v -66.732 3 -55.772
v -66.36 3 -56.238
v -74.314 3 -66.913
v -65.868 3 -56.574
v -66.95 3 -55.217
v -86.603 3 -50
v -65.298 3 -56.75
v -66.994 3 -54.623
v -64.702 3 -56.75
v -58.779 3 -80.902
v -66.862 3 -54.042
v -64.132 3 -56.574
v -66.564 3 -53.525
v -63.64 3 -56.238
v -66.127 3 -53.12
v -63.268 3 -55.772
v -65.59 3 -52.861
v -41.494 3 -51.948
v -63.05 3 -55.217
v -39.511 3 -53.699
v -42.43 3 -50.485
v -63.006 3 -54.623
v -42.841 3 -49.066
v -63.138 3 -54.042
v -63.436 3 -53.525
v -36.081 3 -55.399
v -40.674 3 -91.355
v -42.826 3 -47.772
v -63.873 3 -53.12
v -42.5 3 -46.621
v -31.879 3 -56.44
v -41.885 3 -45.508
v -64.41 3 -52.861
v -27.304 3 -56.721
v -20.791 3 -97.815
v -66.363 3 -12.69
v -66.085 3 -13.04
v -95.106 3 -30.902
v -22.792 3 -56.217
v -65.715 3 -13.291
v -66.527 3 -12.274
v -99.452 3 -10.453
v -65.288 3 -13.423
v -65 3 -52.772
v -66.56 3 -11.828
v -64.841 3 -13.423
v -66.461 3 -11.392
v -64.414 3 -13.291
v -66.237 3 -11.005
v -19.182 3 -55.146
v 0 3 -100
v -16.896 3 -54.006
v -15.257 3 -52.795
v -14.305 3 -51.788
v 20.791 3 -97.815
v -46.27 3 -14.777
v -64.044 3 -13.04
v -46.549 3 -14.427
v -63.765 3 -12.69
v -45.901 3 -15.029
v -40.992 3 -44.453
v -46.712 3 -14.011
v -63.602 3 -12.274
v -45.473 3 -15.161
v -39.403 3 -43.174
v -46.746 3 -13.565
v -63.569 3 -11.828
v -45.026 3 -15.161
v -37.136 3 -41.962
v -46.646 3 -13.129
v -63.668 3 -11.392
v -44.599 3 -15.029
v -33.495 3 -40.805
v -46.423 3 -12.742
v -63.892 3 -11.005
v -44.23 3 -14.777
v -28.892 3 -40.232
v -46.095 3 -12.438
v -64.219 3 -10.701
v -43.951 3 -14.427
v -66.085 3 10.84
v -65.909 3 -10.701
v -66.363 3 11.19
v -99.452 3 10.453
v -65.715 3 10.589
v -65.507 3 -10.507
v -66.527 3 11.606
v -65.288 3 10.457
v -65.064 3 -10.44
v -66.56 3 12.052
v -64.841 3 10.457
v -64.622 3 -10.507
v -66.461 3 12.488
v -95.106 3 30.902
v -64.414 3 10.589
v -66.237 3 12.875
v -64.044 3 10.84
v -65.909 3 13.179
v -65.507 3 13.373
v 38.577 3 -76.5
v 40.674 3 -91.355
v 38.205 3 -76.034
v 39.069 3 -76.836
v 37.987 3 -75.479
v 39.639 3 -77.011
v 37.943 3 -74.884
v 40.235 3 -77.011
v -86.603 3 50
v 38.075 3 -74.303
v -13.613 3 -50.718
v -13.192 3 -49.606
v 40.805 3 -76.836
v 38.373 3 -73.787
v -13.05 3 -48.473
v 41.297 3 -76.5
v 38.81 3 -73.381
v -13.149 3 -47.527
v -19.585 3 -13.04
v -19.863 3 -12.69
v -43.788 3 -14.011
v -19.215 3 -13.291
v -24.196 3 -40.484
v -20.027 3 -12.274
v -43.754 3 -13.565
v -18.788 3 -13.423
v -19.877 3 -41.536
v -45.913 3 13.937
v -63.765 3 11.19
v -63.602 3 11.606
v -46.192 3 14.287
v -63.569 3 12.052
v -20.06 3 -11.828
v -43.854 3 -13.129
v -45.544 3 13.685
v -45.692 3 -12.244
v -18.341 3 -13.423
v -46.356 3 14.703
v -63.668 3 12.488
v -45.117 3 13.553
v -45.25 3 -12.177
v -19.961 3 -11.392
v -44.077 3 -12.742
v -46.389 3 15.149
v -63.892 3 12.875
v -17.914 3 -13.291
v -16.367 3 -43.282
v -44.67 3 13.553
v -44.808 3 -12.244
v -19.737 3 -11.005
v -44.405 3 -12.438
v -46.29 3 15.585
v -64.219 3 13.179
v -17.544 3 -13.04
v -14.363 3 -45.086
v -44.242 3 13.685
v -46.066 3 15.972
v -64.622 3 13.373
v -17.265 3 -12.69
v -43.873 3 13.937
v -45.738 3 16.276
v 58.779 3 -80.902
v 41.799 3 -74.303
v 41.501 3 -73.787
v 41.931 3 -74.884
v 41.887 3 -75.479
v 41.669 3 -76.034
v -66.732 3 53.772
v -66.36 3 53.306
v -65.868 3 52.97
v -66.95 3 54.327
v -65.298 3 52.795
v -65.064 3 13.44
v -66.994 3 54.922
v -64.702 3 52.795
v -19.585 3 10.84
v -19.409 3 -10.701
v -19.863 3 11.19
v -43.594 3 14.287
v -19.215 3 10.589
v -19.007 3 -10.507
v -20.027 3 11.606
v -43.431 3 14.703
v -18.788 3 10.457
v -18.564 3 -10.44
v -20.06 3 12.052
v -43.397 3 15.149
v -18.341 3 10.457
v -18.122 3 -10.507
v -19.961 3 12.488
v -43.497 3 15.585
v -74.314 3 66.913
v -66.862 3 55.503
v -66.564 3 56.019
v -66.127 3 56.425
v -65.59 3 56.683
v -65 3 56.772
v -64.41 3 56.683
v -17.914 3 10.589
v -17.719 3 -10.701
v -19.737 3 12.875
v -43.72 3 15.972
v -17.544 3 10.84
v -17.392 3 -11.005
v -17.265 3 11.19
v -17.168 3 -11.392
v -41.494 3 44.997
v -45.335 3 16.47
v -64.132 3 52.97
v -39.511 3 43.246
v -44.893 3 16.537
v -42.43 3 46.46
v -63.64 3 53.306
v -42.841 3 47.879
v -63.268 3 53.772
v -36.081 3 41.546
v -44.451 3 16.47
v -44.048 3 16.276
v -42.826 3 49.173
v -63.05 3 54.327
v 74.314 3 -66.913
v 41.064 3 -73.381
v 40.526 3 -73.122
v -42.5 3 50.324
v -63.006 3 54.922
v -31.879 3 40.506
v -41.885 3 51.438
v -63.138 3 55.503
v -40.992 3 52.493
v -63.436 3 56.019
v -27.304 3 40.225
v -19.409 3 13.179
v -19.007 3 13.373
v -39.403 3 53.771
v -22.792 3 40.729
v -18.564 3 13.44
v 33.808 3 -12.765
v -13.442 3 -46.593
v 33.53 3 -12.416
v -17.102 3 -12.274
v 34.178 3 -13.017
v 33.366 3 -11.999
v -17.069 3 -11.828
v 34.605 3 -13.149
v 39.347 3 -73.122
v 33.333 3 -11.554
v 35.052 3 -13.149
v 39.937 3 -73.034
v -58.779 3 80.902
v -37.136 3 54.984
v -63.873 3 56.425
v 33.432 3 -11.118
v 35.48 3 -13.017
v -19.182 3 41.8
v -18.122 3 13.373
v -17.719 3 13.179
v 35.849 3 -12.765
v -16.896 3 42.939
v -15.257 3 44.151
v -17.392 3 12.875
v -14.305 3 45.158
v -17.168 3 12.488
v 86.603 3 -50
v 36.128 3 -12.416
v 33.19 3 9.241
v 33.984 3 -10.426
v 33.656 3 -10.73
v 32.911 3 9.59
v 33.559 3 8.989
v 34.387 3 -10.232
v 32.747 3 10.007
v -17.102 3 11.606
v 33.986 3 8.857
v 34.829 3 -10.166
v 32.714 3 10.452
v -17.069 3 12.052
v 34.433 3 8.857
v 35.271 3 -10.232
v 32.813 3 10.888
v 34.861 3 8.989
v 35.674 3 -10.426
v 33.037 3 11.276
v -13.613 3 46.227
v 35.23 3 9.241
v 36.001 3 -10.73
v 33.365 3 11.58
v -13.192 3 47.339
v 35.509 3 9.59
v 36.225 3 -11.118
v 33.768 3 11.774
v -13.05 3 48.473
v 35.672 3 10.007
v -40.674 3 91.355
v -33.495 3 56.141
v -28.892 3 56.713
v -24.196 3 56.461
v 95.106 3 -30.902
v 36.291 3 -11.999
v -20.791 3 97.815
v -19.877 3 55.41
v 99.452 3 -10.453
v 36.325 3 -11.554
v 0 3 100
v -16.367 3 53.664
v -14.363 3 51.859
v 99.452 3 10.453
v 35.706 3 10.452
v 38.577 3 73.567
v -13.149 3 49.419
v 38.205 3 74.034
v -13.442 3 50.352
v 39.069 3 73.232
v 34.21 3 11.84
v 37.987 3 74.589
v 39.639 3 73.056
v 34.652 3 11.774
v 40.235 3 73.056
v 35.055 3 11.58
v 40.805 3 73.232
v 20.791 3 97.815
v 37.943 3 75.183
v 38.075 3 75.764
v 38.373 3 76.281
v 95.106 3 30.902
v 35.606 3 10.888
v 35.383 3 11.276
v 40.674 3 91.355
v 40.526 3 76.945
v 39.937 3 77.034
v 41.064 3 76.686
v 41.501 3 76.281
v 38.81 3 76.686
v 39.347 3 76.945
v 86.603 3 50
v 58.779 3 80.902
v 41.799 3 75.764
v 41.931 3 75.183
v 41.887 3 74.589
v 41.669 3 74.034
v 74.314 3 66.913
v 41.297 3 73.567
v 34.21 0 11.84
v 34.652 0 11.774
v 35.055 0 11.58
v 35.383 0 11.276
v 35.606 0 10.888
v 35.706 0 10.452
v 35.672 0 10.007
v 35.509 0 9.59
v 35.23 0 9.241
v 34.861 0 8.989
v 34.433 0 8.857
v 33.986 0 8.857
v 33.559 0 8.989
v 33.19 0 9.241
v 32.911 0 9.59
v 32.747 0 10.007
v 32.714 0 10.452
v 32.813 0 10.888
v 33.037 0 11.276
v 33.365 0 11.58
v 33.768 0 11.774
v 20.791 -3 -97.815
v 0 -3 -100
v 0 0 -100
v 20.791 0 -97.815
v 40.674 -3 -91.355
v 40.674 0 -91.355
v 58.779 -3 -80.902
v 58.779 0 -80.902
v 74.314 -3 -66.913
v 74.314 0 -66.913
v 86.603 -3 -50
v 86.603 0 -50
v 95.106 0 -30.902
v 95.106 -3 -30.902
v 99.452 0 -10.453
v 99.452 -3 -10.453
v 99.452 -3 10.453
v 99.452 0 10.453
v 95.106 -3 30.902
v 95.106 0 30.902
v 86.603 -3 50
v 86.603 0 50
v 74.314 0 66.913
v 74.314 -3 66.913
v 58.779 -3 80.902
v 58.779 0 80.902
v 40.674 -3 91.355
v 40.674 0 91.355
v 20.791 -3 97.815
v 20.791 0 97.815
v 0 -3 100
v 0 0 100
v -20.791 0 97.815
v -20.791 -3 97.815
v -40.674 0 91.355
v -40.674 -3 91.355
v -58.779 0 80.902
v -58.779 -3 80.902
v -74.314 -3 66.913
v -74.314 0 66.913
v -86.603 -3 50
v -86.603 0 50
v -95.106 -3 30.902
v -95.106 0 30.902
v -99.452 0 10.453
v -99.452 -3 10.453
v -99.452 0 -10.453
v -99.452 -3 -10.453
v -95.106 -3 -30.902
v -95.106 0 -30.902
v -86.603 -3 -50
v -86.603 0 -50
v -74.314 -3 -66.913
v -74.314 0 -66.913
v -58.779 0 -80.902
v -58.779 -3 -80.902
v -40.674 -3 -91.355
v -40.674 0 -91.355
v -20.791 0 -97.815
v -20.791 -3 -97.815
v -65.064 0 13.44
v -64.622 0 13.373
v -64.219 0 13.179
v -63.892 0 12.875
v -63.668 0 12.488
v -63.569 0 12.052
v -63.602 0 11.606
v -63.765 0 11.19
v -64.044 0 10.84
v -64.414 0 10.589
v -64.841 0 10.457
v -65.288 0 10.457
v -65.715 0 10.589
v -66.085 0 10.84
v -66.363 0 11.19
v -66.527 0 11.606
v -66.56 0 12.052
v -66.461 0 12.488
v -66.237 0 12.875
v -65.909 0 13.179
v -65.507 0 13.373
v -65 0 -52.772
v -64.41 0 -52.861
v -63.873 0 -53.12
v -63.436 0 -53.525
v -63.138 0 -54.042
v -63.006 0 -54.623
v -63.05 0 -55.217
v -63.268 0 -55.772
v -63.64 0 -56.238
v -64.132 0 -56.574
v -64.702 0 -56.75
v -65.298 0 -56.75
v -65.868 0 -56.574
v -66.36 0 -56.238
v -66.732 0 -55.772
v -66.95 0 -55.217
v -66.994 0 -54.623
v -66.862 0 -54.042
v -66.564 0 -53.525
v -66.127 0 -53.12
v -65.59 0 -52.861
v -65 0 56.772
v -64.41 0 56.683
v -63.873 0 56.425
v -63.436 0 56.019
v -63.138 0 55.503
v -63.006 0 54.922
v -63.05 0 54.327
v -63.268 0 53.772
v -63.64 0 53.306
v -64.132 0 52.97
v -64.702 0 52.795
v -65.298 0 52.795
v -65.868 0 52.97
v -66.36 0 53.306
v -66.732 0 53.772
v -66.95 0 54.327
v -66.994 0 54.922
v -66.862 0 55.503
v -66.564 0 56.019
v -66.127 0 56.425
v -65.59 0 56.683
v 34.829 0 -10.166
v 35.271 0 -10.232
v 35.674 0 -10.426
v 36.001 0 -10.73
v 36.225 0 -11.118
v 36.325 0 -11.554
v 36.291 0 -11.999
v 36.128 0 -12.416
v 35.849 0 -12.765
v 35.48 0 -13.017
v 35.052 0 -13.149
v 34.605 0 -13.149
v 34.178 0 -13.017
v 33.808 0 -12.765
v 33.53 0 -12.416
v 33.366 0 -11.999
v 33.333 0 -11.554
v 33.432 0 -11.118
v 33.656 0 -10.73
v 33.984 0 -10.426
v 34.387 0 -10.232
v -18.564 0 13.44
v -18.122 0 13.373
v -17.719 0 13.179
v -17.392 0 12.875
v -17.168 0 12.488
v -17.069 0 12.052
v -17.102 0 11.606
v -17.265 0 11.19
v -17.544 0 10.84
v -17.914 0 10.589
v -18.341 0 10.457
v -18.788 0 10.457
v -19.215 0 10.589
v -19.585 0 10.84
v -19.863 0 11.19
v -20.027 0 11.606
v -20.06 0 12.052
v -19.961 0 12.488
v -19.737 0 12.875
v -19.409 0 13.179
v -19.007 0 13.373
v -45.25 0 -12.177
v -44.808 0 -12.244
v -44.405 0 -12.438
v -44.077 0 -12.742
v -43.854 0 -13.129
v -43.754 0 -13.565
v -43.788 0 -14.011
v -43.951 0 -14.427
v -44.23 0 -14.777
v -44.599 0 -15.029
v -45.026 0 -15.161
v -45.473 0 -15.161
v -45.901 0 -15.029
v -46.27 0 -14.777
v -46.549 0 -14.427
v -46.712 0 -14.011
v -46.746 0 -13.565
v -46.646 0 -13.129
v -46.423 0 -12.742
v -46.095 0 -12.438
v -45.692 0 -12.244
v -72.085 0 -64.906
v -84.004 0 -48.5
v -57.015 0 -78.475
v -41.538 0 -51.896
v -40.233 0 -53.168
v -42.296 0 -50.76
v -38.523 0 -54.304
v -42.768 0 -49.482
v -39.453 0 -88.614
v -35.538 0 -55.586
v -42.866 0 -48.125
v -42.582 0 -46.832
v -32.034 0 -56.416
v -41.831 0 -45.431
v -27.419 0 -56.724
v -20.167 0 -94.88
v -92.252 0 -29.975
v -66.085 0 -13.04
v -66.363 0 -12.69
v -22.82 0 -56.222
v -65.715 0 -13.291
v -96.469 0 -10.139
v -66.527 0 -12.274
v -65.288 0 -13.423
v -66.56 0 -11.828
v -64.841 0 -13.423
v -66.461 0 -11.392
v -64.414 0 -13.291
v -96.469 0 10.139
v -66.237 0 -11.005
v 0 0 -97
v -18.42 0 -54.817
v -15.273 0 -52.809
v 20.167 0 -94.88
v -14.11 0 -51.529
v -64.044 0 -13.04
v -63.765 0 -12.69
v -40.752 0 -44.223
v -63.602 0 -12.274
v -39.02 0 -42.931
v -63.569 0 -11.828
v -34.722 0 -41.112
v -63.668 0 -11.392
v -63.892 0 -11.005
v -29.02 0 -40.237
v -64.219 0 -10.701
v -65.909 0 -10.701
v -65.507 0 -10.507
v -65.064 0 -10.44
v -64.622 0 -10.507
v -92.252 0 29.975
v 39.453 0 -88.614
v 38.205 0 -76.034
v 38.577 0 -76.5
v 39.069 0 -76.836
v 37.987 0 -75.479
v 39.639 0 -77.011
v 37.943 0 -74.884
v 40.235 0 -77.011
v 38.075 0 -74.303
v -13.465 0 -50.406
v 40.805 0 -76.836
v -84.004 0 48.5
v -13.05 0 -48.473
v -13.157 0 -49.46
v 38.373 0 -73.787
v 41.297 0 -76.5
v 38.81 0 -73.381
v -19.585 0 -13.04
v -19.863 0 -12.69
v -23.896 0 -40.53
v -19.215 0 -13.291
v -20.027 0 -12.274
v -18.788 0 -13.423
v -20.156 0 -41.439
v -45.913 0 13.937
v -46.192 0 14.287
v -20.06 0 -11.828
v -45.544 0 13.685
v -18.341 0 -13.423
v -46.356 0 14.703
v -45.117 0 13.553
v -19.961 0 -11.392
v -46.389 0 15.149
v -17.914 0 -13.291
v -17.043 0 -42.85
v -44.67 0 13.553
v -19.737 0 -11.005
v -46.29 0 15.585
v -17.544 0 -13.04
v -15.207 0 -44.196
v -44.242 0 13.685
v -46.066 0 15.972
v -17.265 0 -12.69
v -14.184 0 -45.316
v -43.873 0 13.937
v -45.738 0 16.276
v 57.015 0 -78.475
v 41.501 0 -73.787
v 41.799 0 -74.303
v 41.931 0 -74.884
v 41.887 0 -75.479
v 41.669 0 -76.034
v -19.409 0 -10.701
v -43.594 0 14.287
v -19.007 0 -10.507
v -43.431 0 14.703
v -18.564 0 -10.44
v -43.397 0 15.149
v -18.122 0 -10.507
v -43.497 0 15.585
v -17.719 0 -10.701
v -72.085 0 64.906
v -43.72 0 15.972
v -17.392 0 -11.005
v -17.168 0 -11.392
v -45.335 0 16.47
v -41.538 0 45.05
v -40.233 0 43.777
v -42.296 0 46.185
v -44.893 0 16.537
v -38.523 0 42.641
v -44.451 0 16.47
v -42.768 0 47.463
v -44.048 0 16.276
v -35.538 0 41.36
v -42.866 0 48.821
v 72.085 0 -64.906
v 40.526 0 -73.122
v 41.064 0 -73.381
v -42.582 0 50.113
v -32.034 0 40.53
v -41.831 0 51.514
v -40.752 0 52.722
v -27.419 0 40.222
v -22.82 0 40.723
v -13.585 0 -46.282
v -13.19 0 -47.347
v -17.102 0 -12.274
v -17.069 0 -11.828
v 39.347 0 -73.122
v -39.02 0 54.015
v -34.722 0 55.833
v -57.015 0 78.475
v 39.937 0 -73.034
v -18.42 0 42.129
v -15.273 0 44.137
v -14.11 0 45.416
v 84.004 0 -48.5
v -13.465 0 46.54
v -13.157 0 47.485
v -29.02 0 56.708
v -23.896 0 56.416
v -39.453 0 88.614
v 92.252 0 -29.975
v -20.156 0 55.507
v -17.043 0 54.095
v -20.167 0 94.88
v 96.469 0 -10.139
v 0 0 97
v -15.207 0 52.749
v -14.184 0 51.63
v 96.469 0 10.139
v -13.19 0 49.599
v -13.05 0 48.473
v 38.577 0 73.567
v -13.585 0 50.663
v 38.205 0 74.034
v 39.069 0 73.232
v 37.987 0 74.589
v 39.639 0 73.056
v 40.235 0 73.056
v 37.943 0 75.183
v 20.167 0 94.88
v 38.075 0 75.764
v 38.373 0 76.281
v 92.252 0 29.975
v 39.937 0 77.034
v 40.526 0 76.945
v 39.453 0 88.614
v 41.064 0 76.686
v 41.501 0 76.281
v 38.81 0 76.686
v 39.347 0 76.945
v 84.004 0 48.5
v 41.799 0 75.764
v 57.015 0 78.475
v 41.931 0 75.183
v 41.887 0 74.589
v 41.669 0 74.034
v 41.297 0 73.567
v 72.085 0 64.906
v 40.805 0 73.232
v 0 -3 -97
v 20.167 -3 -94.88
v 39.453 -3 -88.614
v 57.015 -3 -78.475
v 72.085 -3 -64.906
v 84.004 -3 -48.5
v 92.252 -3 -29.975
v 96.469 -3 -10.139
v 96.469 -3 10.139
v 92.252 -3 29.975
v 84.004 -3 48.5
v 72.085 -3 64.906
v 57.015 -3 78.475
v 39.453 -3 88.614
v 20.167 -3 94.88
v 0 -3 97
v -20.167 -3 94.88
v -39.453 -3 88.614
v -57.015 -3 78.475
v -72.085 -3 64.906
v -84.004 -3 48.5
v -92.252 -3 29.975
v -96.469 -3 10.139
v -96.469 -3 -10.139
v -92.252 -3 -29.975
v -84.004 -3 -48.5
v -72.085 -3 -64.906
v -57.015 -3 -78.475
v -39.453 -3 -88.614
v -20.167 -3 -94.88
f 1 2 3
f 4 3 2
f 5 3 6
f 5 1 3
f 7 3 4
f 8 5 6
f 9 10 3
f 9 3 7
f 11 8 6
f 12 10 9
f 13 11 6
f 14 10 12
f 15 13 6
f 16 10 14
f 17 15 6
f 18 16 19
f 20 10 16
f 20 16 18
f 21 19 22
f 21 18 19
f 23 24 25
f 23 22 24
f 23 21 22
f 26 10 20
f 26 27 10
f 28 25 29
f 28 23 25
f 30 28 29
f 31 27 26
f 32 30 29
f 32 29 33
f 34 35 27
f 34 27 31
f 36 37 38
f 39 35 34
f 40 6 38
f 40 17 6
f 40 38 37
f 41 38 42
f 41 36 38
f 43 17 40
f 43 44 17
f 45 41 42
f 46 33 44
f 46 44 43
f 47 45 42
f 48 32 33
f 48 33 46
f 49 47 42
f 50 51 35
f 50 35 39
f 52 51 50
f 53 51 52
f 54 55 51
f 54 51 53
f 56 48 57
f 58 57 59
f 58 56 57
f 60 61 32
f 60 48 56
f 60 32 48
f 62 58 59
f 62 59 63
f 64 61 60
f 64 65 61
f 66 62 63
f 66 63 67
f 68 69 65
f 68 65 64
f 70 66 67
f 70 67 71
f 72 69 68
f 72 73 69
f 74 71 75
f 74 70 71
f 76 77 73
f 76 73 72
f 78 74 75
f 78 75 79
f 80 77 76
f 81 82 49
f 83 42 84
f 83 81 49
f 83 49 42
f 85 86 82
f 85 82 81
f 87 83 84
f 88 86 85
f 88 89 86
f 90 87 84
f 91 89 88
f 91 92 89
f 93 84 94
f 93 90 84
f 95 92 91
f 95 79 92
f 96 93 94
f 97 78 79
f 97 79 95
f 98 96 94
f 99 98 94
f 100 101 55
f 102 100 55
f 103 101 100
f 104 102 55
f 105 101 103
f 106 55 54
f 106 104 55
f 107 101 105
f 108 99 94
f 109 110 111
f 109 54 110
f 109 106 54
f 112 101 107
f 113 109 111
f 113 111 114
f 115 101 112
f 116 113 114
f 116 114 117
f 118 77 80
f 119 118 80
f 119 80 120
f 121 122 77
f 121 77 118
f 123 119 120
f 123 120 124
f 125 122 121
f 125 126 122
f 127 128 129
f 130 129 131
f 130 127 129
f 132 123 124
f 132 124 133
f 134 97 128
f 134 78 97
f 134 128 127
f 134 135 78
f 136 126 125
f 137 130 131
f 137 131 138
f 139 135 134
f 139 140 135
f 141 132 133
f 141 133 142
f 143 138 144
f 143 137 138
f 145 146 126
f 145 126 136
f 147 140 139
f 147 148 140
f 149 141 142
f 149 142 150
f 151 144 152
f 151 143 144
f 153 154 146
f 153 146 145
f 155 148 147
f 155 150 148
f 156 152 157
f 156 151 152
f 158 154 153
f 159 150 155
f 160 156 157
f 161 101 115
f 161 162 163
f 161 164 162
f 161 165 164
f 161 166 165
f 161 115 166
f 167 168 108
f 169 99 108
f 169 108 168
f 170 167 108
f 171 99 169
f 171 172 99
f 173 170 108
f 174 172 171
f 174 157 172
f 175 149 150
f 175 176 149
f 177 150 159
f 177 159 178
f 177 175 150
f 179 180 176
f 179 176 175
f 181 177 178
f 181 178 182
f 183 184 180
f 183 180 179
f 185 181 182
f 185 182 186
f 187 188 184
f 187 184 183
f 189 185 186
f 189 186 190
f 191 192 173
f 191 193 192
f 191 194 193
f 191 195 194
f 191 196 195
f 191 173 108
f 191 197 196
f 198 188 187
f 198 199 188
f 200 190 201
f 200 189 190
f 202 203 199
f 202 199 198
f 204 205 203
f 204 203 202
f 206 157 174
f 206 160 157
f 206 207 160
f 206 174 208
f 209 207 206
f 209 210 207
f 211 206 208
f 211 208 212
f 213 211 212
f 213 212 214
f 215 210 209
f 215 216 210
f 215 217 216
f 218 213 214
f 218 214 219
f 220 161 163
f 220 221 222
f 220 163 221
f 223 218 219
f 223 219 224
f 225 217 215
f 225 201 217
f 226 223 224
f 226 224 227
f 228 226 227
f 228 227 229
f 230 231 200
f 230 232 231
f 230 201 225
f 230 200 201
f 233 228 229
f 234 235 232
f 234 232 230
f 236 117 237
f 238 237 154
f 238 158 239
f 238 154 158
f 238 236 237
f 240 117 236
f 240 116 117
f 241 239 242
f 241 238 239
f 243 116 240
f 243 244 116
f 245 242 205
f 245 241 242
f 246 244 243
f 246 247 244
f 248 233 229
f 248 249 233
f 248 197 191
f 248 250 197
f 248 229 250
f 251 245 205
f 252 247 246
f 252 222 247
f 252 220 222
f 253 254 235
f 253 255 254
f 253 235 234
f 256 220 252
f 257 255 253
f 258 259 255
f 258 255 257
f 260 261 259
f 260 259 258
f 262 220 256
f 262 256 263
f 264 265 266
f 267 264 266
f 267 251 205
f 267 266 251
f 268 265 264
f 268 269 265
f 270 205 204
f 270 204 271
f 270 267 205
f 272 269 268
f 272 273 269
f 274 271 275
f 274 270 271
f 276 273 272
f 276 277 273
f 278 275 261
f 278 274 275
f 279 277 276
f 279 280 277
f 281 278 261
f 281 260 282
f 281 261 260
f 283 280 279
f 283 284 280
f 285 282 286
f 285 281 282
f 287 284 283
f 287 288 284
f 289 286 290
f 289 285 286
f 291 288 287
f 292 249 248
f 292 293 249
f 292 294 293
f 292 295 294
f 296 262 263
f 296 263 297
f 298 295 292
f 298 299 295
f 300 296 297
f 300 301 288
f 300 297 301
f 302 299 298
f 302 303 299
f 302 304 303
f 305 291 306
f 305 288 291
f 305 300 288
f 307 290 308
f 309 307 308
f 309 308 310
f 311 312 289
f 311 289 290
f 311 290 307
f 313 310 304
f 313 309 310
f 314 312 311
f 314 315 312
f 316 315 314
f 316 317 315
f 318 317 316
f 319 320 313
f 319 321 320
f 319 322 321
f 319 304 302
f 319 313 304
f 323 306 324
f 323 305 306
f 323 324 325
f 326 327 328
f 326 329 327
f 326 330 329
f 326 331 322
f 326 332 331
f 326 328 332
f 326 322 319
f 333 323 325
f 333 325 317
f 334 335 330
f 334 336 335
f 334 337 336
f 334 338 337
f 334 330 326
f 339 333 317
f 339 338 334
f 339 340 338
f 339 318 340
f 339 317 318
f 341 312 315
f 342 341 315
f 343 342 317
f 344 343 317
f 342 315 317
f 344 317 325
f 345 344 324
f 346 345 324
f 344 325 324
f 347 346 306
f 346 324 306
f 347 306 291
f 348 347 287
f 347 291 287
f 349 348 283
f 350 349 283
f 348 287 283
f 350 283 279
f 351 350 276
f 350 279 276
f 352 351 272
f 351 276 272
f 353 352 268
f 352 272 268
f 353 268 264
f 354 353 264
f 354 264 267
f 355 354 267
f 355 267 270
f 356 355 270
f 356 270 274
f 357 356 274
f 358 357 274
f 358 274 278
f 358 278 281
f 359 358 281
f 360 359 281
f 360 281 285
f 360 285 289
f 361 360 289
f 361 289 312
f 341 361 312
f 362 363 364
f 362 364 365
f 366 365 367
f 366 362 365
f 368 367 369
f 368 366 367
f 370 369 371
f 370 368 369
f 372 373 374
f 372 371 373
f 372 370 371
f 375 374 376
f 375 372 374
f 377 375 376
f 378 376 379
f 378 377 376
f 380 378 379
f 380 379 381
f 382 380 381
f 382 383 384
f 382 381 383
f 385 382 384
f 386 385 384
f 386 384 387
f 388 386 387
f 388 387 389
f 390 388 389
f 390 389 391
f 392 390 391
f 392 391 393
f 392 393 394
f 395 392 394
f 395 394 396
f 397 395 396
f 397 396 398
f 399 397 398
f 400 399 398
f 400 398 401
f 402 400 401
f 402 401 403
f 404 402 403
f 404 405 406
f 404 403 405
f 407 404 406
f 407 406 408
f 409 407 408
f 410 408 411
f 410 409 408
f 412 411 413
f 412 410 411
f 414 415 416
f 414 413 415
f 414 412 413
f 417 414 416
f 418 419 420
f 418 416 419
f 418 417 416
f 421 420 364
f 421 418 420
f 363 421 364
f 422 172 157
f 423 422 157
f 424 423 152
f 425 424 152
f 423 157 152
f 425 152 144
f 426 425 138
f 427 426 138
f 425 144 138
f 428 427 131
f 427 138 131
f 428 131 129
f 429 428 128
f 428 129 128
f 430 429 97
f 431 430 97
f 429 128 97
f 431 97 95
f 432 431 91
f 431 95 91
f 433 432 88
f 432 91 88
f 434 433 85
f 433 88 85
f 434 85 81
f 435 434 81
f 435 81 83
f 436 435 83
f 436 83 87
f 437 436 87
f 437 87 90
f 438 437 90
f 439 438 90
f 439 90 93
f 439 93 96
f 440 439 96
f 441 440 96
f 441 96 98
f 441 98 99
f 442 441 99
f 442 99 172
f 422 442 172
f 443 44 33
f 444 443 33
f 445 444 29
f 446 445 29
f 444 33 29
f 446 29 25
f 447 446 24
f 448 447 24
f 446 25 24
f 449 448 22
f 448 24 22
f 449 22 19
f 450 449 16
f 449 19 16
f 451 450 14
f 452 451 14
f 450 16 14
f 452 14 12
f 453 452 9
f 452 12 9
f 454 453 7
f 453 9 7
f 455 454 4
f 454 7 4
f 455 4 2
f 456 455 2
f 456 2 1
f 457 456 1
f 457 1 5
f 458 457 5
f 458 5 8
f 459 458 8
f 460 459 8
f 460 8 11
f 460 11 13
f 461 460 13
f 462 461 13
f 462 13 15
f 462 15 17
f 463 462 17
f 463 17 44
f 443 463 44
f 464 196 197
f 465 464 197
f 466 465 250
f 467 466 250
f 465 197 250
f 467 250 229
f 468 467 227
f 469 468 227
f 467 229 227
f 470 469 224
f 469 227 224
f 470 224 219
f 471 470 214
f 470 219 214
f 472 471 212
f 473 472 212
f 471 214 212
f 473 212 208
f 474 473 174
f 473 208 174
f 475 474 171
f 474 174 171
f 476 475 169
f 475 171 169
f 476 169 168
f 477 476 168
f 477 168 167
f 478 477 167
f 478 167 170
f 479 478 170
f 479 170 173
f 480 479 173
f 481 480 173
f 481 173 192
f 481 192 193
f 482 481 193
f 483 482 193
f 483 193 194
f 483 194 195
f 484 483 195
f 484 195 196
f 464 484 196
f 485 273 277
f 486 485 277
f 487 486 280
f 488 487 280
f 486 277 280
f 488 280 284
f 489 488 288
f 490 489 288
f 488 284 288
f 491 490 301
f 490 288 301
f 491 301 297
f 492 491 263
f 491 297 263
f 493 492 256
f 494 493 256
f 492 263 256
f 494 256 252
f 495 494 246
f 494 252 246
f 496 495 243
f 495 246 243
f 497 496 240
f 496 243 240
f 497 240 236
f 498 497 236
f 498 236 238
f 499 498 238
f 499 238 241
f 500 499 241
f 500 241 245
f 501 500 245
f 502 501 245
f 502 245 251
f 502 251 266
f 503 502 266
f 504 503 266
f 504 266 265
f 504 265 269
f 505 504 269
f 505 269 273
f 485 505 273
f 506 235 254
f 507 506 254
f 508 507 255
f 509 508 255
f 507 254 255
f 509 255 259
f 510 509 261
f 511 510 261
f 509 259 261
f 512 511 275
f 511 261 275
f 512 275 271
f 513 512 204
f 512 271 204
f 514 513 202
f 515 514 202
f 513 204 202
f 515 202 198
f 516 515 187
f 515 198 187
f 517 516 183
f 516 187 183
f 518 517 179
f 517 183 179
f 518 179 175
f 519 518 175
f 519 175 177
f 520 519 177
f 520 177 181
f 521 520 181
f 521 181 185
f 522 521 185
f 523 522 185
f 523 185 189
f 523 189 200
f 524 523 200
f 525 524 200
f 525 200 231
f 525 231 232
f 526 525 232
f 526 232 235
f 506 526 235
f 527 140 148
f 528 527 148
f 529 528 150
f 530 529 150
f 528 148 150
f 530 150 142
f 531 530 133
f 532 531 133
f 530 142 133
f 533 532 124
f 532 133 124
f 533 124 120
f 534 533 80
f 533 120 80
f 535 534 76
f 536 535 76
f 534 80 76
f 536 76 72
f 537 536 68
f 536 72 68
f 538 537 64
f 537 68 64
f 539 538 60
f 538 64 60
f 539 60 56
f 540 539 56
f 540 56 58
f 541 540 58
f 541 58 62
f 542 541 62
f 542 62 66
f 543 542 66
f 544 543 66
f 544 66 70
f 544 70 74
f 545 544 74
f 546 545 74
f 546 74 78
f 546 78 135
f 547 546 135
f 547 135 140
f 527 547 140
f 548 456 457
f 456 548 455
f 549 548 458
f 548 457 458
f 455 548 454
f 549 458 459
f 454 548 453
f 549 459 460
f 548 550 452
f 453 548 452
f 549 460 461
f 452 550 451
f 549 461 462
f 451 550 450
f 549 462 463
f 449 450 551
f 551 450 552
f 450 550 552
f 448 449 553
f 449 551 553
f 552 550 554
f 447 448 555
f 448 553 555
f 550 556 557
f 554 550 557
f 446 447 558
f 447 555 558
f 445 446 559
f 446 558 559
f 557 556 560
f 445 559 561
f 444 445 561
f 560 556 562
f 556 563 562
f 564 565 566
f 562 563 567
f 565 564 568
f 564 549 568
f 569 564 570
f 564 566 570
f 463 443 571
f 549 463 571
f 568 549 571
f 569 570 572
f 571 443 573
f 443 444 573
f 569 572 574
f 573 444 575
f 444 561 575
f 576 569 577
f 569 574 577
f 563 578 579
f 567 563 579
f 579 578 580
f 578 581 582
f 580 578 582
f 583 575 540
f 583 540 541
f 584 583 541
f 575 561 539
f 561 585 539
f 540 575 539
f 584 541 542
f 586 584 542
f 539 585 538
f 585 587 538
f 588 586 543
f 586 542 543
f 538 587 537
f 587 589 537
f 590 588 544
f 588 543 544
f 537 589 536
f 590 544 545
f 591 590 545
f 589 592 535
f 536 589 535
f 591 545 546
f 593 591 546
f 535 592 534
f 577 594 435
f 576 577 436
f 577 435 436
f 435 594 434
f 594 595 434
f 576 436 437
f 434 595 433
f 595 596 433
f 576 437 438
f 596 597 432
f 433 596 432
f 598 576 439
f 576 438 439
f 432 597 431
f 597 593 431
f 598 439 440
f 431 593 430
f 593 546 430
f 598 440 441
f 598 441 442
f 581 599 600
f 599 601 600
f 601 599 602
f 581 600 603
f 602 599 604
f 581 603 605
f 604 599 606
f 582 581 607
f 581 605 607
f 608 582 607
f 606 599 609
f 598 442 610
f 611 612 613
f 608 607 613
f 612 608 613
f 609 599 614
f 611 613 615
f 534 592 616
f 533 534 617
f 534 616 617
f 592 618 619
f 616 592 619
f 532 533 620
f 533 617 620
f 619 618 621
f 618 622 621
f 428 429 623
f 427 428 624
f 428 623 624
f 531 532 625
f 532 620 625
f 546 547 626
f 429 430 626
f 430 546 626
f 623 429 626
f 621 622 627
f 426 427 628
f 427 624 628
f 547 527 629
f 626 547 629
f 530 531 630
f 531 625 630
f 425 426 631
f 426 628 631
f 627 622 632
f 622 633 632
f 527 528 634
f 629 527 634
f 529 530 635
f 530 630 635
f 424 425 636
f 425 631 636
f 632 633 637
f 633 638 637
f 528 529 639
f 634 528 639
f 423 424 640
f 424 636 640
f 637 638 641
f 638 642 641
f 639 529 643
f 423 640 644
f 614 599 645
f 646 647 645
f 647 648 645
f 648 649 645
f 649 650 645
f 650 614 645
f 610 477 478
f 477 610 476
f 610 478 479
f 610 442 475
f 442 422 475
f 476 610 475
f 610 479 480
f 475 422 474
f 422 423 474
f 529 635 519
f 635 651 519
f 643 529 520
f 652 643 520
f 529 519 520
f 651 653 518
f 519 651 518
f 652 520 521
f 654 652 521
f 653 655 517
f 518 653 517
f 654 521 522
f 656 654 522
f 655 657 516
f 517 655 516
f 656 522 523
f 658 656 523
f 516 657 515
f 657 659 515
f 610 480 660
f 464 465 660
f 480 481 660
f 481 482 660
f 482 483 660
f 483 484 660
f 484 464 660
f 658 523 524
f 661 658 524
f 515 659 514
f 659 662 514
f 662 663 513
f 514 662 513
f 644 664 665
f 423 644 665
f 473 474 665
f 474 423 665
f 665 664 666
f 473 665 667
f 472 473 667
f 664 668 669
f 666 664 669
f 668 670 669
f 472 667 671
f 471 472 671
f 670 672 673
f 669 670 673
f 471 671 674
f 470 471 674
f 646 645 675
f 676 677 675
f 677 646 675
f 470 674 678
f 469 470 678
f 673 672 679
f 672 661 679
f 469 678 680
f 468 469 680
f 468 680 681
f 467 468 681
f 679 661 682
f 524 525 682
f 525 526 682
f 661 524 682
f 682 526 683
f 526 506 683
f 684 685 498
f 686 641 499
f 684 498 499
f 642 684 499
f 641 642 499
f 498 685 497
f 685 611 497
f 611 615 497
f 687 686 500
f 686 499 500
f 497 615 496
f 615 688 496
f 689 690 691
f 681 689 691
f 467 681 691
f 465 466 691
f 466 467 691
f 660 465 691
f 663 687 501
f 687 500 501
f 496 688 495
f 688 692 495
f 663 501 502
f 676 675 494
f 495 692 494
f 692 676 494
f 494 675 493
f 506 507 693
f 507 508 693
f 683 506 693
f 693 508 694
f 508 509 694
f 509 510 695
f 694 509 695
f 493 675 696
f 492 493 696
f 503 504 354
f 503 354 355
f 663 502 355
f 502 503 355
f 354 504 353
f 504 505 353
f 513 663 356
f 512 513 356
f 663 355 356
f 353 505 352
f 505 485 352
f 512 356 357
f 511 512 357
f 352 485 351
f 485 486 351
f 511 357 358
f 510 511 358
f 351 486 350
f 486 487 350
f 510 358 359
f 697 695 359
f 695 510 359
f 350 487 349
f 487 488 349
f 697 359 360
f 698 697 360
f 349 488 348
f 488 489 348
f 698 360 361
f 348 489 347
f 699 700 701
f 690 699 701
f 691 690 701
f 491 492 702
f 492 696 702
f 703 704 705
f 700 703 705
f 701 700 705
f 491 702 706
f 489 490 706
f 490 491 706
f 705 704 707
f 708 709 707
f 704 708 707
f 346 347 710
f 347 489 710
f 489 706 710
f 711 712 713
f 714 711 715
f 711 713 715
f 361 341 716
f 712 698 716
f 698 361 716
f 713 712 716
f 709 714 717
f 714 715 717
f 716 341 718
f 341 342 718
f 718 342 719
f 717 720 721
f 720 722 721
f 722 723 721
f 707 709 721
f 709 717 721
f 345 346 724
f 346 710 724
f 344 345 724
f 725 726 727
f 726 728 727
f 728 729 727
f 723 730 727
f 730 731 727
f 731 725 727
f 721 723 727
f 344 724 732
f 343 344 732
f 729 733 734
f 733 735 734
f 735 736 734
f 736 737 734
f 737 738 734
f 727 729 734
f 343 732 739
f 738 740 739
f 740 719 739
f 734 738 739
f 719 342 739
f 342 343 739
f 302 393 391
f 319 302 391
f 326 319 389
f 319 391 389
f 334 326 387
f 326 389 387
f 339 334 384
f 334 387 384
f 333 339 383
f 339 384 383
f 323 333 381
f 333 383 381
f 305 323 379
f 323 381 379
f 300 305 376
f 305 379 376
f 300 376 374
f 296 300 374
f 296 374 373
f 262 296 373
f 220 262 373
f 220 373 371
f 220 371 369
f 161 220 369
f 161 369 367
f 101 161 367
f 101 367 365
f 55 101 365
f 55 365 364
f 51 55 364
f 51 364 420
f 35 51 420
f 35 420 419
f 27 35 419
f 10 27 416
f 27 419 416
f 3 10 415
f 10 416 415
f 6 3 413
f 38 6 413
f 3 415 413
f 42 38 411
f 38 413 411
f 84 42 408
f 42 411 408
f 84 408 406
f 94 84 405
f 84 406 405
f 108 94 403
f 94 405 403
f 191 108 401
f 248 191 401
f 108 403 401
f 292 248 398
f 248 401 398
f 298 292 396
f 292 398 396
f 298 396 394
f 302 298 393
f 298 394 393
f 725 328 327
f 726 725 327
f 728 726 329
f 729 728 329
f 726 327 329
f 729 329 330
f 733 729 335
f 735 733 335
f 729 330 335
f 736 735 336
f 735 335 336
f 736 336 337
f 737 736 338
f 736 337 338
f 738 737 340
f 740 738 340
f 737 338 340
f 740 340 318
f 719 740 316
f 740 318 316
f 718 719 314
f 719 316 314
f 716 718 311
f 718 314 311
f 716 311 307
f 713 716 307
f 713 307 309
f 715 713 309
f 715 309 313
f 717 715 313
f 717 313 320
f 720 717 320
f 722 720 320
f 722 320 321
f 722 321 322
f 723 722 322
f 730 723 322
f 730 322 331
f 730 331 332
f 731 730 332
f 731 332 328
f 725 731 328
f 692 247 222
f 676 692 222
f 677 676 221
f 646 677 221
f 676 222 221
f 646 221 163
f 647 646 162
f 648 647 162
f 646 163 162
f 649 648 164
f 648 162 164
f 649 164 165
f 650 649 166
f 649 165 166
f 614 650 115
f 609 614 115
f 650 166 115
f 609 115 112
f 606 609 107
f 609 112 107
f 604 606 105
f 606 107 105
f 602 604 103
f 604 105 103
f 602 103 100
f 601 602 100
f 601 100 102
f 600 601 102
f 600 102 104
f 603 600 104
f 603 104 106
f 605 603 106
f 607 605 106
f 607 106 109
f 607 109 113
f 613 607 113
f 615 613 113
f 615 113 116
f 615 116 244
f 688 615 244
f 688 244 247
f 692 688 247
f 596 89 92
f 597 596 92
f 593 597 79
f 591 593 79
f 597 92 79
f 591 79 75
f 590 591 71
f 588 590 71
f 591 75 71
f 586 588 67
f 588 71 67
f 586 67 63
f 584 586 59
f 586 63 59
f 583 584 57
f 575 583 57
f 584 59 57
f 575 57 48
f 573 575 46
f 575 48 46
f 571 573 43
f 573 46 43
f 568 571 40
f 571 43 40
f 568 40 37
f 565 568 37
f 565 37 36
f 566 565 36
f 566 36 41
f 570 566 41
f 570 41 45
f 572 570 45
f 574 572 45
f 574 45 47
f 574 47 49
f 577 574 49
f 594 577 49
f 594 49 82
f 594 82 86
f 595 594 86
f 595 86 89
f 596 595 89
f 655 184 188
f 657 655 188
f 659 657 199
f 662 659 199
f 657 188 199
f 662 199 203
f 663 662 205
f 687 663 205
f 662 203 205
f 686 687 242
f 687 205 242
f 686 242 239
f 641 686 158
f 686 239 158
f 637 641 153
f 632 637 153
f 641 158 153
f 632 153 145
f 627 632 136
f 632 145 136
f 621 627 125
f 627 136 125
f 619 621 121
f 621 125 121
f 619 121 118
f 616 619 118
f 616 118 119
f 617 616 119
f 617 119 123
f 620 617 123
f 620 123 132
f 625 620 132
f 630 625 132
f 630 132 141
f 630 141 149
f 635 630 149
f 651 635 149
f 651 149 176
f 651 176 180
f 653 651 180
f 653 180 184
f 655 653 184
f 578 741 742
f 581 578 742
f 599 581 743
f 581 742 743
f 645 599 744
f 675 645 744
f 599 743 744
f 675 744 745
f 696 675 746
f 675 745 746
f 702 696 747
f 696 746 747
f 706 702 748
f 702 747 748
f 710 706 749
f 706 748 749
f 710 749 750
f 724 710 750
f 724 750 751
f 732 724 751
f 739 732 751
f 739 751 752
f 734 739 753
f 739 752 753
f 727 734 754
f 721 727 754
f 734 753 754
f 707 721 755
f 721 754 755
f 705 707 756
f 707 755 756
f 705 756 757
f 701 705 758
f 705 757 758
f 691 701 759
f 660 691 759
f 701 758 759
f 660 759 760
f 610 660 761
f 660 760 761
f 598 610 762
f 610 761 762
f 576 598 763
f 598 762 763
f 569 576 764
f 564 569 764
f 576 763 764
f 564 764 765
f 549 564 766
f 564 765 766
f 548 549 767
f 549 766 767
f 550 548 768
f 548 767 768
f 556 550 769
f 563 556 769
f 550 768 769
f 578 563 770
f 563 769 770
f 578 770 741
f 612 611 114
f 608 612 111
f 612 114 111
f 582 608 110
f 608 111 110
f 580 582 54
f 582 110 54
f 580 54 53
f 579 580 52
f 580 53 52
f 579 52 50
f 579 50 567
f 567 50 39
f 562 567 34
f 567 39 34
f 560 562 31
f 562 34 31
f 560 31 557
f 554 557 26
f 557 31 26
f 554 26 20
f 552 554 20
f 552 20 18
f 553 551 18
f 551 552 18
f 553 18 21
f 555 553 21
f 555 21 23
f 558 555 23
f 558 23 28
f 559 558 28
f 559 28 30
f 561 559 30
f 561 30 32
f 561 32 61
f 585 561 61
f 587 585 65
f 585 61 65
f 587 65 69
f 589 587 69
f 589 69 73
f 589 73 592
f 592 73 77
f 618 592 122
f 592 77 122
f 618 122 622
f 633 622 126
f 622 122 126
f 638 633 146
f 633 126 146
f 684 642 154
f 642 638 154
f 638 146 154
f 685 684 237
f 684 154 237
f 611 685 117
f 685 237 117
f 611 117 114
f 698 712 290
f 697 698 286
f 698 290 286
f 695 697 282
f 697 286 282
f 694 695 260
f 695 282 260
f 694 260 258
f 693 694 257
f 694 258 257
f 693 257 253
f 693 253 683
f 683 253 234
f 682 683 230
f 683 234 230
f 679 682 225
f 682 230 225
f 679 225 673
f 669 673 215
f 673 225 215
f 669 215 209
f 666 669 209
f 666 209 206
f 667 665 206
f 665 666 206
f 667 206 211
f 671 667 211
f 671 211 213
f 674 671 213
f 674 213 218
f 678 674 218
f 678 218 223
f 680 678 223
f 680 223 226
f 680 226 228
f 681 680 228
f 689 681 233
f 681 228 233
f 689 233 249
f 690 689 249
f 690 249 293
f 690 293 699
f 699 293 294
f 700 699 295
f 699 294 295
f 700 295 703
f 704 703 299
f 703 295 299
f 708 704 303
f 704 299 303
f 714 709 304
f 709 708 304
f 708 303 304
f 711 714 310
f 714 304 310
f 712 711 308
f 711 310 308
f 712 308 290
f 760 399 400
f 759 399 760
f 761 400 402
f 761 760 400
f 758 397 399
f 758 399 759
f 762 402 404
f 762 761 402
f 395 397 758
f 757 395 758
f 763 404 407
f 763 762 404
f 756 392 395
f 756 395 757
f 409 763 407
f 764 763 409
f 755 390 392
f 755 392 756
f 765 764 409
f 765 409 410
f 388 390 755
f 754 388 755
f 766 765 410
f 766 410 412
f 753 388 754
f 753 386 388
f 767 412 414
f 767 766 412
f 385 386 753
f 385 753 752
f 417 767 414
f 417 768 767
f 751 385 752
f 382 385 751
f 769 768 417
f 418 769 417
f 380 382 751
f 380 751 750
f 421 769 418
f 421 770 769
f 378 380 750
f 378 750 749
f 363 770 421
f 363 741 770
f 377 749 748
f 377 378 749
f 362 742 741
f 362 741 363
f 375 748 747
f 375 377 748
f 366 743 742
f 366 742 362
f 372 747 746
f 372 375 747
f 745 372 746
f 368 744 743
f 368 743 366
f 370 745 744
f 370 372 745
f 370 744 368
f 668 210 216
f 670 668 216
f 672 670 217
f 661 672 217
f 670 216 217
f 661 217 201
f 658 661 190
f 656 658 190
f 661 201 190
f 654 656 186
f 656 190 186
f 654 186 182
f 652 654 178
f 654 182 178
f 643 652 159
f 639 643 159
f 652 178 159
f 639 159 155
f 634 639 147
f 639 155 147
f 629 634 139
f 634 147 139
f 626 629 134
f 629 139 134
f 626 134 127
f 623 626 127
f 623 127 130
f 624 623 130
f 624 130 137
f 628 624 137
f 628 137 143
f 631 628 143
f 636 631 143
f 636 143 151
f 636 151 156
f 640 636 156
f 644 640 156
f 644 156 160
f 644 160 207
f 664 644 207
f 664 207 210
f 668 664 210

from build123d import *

# Parameters (mm, degrees)
SKETCH_1_R          = 100
EXTRUDE_1_DEPTH     = 3
SKETCH_5_R          = 2
CUT_EXTRUDE_3_DEPTH = 10
SKETCH_6_R          = 1.5
CUT_EXTRUDE_4_DEPTH = 10
SKETCH_7_RX         = 14.914689971
SKETCH_7_RY         = 8.256346234
CUT_EXTRUDE_5_DEPTH = 10
EXTRUDE_START       = 3
SKETCH_9_R          = 100
SKETCH_9_R_2        = 97
EXTRUDE_3_DEPTH     = 3


with BuildPart() as part:
    # Эскиз1 → Бобышка-Вытянуть1 (new body)
    with BuildSketch(Plane(origin=(0, 0, 0), x_dir=(1, 0, 0), z_dir=(0, 1, 0))):
        with Locations(Location((0, 0, 0), (0, 0, 270))):
            Circle(SKETCH_1_R)
    extrude(amount=EXTRUDE_1_DEPTH)

    # Эскиз5 → Вырез-Вытянуть3 (cut)
    with BuildSketch(Plane(origin=(0, 3, 0), x_dir=(1, 0, 0), z_dir=(0, 1, 0))):
        with Locations(Location((39.936936383, -75.033599889, 0), (0, 0, 270))):
            Circle(SKETCH_5_R)
        with Locations(Location((39.936936383, 75.033599889, 0), (0, 0, 270))):
            Circle(SKETCH_5_R)
        with Locations(Location((-65, 54.772255751, 0), (0, 0, 270))):
            Circle(SKETCH_5_R)
        with Locations(Location((-65, -54.772255751, 0), (0, 0, 270))):
            Circle(SKETCH_5_R)
    extrude(amount=-CUT_EXTRUDE_3_DEPTH, mode=Mode.SUBTRACT)

    # Эскиз6 → Вырез-Вытянуть4 (cut)
    with BuildSketch(Plane(origin=(0, 3, 0), x_dir=(1, 0, 0), z_dir=(0, 1, 0))):
        with Locations(Location((-65.064398668, 11.94, 0), (0, 0, 270))):
            Circle(SKETCH_6_R)
        with Locations(Location((-18.564398668, 11.94, 0), (0, 0, 270))):
            Circle(SKETCH_6_R)
        with Locations(Location((-18.564398668, -11.94, 0), (0, 0, 270))):
            Circle(SKETCH_6_R)
        with Locations(Location((-65.064398668, -11.94, 0), (0, 0, 270))):
            Circle(SKETCH_6_R)
        with Locations(Location((34.209802243, -10.340313566, 0), (0, 0, 270))):
            Circle(SKETCH_6_R)
        with Locations(Location((34.82871581, 11.665691446, 0), (0, 0, 270))):
            Circle(SKETCH_6_R)
        with Locations(Location((-45.249923126, 13.677319461, 0), (0, 0, 270))):
            Circle(SKETCH_6_R)
        with Locations(Location((-44.893210092, -15.036739793, 0), (0, 0, 270))):
            Circle(SKETCH_6_R)
    extrude(amount=-CUT_EXTRUDE_4_DEPTH, mode=Mode.SUBTRACT)

    # Эскиз7 → Вырез-Вытянуть5 (cut)
    with BuildSketch(Plane(origin=(0, 3, 0), x_dir=(1, 0, 0), z_dir=(0, 1, 0))):
        with Locations((-27.965043695, 48.472742405)):
            Ellipse(SKETCH_7_RX, SKETCH_7_RY)
        with Locations((-27.965043695, -48.472742405)):
            Ellipse(SKETCH_7_RX, SKETCH_7_RY)
    extrude(amount=-CUT_EXTRUDE_5_DEPTH, mode=Mode.SUBTRACT)

    # Эскиз9 → Бобышка-Вытянуть3 (add)
    with BuildSketch(Plane.XZ.offset(EXTRUDE_START)):
        with Locations(Location((0, 0, 0), (0, 0, 270))):
            Circle(SKETCH_9_R)
        with Locations(Location((0, 0, 0), (0, 0, 270))):
            Circle(SKETCH_9_R_2, mode=Mode.SUBTRACT)
    extrude(amount=-EXTRUDE_3_DEPTH)


solid = part.part
